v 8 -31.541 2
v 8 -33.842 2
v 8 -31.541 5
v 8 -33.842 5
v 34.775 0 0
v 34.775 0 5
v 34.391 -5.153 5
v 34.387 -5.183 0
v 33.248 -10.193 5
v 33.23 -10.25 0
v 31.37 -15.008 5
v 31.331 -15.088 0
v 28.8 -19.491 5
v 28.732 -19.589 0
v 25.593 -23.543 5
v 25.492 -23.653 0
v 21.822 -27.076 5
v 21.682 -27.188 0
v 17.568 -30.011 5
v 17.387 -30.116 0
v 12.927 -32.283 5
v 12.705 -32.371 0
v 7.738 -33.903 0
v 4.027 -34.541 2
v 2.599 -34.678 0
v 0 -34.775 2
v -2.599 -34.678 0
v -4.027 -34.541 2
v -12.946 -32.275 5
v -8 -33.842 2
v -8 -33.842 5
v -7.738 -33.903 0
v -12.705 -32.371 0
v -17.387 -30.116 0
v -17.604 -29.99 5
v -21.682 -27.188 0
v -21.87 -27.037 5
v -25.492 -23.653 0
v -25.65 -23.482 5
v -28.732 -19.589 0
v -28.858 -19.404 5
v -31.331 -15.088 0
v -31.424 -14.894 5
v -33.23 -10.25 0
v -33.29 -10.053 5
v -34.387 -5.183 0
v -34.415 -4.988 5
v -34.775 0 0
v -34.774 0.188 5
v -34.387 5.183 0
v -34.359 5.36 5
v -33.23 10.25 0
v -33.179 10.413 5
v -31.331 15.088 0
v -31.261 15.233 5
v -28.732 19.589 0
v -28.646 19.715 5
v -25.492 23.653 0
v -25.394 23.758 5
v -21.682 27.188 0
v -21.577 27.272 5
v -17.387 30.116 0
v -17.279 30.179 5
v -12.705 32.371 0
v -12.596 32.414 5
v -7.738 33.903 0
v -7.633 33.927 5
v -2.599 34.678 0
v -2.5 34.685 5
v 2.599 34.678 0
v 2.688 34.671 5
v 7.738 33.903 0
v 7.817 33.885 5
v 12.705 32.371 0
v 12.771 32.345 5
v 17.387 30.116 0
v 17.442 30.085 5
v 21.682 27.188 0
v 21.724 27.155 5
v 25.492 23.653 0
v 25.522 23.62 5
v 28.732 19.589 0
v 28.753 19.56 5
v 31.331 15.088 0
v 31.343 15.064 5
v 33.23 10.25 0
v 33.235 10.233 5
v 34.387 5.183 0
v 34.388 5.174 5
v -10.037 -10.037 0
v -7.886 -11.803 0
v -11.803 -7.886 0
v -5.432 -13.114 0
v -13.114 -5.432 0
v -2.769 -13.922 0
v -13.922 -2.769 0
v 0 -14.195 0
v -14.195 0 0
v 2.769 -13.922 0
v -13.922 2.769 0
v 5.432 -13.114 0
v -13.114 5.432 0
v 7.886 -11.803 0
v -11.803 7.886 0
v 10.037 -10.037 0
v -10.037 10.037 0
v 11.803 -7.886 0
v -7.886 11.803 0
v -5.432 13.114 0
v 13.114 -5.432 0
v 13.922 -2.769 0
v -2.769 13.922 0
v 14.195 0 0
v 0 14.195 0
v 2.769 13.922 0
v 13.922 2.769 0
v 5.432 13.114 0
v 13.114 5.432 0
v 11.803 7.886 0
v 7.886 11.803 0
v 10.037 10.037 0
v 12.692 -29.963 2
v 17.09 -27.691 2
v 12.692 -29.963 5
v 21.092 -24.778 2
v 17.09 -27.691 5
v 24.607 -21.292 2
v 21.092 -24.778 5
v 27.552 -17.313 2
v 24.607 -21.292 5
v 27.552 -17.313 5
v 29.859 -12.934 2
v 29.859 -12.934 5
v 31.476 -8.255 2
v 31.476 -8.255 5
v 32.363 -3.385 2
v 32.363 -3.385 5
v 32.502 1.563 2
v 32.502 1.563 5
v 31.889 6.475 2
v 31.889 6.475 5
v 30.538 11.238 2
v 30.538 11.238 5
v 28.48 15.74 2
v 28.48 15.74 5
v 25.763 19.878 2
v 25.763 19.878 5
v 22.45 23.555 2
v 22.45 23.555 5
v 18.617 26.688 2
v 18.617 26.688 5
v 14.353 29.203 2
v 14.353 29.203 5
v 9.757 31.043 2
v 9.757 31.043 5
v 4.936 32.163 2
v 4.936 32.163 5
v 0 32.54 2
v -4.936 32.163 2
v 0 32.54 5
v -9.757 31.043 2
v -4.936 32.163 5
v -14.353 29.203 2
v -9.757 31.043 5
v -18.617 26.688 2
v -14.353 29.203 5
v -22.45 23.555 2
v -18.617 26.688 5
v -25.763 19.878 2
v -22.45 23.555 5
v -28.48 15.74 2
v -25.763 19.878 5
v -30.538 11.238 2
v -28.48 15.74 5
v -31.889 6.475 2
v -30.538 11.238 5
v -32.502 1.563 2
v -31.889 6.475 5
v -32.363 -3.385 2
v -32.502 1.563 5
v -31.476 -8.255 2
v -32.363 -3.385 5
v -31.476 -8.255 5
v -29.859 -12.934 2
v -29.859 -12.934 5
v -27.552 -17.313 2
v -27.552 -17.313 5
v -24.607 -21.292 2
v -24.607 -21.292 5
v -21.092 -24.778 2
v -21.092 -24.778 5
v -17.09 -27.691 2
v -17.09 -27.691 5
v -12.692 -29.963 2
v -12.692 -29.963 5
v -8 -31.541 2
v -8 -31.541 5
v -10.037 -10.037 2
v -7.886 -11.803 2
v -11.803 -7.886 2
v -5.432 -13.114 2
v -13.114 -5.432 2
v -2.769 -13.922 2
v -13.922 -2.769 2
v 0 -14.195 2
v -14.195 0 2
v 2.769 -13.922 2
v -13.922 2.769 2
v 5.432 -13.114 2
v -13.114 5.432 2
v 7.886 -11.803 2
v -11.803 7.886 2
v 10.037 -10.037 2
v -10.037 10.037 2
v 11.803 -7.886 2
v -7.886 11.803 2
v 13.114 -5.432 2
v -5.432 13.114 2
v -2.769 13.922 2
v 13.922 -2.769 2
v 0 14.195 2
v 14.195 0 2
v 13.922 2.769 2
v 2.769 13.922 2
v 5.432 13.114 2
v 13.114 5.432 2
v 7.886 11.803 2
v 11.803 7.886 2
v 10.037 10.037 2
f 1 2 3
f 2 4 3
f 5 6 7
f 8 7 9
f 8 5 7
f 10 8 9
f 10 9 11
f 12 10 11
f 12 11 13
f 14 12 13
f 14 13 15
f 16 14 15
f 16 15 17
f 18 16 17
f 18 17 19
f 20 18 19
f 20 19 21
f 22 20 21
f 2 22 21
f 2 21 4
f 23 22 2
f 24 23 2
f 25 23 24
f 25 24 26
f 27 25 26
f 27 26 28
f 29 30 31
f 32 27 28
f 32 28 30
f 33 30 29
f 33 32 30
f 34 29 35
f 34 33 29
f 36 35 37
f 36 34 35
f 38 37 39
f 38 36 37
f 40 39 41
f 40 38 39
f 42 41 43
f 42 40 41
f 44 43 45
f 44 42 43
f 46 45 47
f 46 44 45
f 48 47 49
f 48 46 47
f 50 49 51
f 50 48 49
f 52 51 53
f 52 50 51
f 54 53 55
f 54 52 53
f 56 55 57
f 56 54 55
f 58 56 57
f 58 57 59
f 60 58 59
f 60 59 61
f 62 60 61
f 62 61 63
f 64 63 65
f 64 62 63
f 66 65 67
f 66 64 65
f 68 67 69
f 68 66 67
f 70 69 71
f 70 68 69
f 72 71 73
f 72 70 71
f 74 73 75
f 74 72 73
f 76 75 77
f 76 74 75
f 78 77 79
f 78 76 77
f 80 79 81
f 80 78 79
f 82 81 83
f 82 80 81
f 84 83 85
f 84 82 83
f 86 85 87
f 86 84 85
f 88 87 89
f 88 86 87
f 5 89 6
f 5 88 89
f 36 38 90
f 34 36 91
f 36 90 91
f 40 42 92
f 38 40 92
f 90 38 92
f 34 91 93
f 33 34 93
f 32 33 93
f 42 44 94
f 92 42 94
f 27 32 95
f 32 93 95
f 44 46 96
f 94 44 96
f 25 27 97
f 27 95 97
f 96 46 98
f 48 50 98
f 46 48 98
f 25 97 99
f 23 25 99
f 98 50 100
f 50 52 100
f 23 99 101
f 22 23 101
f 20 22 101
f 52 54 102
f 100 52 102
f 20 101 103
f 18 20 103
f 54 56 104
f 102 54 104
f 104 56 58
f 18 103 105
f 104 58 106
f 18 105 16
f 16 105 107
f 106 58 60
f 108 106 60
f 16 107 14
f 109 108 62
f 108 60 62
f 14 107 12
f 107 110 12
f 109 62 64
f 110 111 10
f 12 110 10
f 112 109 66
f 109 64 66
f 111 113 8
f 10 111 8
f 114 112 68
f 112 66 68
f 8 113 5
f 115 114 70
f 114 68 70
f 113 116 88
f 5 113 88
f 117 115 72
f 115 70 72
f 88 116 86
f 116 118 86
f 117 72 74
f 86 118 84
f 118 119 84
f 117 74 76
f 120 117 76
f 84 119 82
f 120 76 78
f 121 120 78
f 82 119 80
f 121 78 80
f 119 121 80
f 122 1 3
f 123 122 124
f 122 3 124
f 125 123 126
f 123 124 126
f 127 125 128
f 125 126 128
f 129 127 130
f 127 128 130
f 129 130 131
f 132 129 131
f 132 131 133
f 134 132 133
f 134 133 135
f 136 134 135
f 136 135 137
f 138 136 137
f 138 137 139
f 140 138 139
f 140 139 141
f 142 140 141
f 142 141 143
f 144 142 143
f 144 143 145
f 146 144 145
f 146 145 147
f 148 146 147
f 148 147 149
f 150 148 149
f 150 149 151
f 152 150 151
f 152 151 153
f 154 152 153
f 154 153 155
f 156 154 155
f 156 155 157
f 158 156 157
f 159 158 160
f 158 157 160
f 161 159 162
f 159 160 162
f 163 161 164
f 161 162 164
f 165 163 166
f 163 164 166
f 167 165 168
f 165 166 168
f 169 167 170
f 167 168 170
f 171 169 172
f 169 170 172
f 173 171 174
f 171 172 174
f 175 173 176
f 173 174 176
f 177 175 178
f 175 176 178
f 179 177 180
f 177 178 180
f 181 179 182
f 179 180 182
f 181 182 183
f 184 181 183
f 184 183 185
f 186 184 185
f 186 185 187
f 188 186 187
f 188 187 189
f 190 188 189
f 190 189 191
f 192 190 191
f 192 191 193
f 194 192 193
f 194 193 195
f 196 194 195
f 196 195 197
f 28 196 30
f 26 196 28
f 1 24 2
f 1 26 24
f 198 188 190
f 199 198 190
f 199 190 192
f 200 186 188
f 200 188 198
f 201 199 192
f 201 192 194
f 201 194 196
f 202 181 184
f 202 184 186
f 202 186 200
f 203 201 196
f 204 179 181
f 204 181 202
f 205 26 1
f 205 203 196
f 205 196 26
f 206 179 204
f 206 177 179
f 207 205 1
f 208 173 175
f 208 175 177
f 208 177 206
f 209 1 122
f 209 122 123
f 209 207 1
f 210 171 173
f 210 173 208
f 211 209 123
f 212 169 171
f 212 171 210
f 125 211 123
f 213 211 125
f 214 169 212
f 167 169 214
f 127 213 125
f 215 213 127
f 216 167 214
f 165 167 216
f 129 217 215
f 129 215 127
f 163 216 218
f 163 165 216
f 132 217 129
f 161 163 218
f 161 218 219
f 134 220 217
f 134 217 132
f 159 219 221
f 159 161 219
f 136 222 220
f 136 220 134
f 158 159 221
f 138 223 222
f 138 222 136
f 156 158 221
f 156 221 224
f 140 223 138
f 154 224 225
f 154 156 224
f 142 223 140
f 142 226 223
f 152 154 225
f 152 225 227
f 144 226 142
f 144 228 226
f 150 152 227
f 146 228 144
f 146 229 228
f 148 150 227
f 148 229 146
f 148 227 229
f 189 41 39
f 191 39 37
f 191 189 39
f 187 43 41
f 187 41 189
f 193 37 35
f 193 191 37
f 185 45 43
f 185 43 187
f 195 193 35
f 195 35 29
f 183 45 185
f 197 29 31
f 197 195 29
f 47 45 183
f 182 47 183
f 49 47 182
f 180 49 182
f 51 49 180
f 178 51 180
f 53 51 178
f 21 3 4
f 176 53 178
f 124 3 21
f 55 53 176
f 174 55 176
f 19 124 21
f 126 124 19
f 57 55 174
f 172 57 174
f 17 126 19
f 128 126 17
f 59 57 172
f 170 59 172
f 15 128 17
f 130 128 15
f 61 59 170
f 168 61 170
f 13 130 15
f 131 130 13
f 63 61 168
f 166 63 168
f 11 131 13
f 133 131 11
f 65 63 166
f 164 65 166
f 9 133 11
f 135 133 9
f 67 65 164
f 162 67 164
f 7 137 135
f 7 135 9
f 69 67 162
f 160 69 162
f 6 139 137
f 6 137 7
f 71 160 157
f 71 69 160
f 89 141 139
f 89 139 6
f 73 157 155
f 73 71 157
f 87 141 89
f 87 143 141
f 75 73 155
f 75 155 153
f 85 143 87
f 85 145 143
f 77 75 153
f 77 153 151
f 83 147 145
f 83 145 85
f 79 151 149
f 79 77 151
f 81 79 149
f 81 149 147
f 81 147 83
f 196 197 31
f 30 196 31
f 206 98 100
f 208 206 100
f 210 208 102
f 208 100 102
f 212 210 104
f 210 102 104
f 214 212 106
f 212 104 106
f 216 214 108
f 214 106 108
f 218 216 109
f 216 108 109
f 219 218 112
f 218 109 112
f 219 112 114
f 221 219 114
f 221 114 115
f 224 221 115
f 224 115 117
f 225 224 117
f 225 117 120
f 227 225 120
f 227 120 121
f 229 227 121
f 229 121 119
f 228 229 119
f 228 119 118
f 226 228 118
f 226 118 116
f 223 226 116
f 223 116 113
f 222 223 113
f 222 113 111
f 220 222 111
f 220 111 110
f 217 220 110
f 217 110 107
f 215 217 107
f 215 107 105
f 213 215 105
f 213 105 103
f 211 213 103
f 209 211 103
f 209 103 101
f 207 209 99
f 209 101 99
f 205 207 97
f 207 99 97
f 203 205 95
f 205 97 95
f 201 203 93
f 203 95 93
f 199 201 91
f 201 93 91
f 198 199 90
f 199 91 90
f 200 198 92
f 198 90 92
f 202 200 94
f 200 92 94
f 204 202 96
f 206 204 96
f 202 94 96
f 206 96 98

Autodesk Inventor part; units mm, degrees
ref_plane "YZ Plane" through (0, 0, 0) normal (1, 0, 0) x (0, 1, 0)
ref_plane "XZ Plane" through (0, 0, 0) normal (0, 1, 0) x (-1, 0, 0)
ref_plane "XY Plane" through (0, 0, 0) normal (0, 0, 1) x (1, 0, 0)
sketch "Skizze1" plane through (0, 0, 0) normal (0, 0, 1) x (1, 0, 0)
  circle A0 centre (0, 0) radius 34.775
  dimension "d0" = 69.55
extrude "Extrusion1" add sketch "Skizze1" along normal blind 5
sketch "Skizze2" plane through (0, 0, 5) normal (0, 0, 1) x (1, 0, 0)
  circle A0 centre (0, 0) radius 32.54
  dimension "d3" = 65.08
extrude "Extrusion2" cut sketch "Skizze2" against normal blind 3
sketch "Skizze3" plane through (0, 0, 0) normal (0, 0, -1) x (-1, 0, 0)
  circle A0 centre (0, 0) radius 14.195
  dimension "d6" = 28.39
extrude "Extrusion3" cut sketch "Skizze3" against normal through all
sketch "Skizze4" plane through (0, 0, 5) normal (0, 0, 1) x (1, 0, 0)
  line L0 (-8, -42.775) -> (8, -42.775)
  line L1 (8, -42.775) -> (8, -26.775)
  line L2 (8, -26.775) -> (-8, -26.775)
  line L3 (-8, -26.775) -> (-8, -42.775)
  circle A0 centre (0, 0) radius 34.775 projected
  line L4 (-8, -42.775) -> (8, -26.775) construction
  line L5 (8, -42.775) -> (-8, -26.775) construction
  point P0 (0, -34.775)
  dimension "d9" = 16
  dimension "d10" = 16
extrude "Extrusion4" cut sketch "Skizze4" against normal up to surface (3 mm away) contours L3 A0 L1 L0 | L3 L2 L1 A0 picked at (0.896, -29.407)
properties part number "2024_08_28_Holder_disk_GL25"
